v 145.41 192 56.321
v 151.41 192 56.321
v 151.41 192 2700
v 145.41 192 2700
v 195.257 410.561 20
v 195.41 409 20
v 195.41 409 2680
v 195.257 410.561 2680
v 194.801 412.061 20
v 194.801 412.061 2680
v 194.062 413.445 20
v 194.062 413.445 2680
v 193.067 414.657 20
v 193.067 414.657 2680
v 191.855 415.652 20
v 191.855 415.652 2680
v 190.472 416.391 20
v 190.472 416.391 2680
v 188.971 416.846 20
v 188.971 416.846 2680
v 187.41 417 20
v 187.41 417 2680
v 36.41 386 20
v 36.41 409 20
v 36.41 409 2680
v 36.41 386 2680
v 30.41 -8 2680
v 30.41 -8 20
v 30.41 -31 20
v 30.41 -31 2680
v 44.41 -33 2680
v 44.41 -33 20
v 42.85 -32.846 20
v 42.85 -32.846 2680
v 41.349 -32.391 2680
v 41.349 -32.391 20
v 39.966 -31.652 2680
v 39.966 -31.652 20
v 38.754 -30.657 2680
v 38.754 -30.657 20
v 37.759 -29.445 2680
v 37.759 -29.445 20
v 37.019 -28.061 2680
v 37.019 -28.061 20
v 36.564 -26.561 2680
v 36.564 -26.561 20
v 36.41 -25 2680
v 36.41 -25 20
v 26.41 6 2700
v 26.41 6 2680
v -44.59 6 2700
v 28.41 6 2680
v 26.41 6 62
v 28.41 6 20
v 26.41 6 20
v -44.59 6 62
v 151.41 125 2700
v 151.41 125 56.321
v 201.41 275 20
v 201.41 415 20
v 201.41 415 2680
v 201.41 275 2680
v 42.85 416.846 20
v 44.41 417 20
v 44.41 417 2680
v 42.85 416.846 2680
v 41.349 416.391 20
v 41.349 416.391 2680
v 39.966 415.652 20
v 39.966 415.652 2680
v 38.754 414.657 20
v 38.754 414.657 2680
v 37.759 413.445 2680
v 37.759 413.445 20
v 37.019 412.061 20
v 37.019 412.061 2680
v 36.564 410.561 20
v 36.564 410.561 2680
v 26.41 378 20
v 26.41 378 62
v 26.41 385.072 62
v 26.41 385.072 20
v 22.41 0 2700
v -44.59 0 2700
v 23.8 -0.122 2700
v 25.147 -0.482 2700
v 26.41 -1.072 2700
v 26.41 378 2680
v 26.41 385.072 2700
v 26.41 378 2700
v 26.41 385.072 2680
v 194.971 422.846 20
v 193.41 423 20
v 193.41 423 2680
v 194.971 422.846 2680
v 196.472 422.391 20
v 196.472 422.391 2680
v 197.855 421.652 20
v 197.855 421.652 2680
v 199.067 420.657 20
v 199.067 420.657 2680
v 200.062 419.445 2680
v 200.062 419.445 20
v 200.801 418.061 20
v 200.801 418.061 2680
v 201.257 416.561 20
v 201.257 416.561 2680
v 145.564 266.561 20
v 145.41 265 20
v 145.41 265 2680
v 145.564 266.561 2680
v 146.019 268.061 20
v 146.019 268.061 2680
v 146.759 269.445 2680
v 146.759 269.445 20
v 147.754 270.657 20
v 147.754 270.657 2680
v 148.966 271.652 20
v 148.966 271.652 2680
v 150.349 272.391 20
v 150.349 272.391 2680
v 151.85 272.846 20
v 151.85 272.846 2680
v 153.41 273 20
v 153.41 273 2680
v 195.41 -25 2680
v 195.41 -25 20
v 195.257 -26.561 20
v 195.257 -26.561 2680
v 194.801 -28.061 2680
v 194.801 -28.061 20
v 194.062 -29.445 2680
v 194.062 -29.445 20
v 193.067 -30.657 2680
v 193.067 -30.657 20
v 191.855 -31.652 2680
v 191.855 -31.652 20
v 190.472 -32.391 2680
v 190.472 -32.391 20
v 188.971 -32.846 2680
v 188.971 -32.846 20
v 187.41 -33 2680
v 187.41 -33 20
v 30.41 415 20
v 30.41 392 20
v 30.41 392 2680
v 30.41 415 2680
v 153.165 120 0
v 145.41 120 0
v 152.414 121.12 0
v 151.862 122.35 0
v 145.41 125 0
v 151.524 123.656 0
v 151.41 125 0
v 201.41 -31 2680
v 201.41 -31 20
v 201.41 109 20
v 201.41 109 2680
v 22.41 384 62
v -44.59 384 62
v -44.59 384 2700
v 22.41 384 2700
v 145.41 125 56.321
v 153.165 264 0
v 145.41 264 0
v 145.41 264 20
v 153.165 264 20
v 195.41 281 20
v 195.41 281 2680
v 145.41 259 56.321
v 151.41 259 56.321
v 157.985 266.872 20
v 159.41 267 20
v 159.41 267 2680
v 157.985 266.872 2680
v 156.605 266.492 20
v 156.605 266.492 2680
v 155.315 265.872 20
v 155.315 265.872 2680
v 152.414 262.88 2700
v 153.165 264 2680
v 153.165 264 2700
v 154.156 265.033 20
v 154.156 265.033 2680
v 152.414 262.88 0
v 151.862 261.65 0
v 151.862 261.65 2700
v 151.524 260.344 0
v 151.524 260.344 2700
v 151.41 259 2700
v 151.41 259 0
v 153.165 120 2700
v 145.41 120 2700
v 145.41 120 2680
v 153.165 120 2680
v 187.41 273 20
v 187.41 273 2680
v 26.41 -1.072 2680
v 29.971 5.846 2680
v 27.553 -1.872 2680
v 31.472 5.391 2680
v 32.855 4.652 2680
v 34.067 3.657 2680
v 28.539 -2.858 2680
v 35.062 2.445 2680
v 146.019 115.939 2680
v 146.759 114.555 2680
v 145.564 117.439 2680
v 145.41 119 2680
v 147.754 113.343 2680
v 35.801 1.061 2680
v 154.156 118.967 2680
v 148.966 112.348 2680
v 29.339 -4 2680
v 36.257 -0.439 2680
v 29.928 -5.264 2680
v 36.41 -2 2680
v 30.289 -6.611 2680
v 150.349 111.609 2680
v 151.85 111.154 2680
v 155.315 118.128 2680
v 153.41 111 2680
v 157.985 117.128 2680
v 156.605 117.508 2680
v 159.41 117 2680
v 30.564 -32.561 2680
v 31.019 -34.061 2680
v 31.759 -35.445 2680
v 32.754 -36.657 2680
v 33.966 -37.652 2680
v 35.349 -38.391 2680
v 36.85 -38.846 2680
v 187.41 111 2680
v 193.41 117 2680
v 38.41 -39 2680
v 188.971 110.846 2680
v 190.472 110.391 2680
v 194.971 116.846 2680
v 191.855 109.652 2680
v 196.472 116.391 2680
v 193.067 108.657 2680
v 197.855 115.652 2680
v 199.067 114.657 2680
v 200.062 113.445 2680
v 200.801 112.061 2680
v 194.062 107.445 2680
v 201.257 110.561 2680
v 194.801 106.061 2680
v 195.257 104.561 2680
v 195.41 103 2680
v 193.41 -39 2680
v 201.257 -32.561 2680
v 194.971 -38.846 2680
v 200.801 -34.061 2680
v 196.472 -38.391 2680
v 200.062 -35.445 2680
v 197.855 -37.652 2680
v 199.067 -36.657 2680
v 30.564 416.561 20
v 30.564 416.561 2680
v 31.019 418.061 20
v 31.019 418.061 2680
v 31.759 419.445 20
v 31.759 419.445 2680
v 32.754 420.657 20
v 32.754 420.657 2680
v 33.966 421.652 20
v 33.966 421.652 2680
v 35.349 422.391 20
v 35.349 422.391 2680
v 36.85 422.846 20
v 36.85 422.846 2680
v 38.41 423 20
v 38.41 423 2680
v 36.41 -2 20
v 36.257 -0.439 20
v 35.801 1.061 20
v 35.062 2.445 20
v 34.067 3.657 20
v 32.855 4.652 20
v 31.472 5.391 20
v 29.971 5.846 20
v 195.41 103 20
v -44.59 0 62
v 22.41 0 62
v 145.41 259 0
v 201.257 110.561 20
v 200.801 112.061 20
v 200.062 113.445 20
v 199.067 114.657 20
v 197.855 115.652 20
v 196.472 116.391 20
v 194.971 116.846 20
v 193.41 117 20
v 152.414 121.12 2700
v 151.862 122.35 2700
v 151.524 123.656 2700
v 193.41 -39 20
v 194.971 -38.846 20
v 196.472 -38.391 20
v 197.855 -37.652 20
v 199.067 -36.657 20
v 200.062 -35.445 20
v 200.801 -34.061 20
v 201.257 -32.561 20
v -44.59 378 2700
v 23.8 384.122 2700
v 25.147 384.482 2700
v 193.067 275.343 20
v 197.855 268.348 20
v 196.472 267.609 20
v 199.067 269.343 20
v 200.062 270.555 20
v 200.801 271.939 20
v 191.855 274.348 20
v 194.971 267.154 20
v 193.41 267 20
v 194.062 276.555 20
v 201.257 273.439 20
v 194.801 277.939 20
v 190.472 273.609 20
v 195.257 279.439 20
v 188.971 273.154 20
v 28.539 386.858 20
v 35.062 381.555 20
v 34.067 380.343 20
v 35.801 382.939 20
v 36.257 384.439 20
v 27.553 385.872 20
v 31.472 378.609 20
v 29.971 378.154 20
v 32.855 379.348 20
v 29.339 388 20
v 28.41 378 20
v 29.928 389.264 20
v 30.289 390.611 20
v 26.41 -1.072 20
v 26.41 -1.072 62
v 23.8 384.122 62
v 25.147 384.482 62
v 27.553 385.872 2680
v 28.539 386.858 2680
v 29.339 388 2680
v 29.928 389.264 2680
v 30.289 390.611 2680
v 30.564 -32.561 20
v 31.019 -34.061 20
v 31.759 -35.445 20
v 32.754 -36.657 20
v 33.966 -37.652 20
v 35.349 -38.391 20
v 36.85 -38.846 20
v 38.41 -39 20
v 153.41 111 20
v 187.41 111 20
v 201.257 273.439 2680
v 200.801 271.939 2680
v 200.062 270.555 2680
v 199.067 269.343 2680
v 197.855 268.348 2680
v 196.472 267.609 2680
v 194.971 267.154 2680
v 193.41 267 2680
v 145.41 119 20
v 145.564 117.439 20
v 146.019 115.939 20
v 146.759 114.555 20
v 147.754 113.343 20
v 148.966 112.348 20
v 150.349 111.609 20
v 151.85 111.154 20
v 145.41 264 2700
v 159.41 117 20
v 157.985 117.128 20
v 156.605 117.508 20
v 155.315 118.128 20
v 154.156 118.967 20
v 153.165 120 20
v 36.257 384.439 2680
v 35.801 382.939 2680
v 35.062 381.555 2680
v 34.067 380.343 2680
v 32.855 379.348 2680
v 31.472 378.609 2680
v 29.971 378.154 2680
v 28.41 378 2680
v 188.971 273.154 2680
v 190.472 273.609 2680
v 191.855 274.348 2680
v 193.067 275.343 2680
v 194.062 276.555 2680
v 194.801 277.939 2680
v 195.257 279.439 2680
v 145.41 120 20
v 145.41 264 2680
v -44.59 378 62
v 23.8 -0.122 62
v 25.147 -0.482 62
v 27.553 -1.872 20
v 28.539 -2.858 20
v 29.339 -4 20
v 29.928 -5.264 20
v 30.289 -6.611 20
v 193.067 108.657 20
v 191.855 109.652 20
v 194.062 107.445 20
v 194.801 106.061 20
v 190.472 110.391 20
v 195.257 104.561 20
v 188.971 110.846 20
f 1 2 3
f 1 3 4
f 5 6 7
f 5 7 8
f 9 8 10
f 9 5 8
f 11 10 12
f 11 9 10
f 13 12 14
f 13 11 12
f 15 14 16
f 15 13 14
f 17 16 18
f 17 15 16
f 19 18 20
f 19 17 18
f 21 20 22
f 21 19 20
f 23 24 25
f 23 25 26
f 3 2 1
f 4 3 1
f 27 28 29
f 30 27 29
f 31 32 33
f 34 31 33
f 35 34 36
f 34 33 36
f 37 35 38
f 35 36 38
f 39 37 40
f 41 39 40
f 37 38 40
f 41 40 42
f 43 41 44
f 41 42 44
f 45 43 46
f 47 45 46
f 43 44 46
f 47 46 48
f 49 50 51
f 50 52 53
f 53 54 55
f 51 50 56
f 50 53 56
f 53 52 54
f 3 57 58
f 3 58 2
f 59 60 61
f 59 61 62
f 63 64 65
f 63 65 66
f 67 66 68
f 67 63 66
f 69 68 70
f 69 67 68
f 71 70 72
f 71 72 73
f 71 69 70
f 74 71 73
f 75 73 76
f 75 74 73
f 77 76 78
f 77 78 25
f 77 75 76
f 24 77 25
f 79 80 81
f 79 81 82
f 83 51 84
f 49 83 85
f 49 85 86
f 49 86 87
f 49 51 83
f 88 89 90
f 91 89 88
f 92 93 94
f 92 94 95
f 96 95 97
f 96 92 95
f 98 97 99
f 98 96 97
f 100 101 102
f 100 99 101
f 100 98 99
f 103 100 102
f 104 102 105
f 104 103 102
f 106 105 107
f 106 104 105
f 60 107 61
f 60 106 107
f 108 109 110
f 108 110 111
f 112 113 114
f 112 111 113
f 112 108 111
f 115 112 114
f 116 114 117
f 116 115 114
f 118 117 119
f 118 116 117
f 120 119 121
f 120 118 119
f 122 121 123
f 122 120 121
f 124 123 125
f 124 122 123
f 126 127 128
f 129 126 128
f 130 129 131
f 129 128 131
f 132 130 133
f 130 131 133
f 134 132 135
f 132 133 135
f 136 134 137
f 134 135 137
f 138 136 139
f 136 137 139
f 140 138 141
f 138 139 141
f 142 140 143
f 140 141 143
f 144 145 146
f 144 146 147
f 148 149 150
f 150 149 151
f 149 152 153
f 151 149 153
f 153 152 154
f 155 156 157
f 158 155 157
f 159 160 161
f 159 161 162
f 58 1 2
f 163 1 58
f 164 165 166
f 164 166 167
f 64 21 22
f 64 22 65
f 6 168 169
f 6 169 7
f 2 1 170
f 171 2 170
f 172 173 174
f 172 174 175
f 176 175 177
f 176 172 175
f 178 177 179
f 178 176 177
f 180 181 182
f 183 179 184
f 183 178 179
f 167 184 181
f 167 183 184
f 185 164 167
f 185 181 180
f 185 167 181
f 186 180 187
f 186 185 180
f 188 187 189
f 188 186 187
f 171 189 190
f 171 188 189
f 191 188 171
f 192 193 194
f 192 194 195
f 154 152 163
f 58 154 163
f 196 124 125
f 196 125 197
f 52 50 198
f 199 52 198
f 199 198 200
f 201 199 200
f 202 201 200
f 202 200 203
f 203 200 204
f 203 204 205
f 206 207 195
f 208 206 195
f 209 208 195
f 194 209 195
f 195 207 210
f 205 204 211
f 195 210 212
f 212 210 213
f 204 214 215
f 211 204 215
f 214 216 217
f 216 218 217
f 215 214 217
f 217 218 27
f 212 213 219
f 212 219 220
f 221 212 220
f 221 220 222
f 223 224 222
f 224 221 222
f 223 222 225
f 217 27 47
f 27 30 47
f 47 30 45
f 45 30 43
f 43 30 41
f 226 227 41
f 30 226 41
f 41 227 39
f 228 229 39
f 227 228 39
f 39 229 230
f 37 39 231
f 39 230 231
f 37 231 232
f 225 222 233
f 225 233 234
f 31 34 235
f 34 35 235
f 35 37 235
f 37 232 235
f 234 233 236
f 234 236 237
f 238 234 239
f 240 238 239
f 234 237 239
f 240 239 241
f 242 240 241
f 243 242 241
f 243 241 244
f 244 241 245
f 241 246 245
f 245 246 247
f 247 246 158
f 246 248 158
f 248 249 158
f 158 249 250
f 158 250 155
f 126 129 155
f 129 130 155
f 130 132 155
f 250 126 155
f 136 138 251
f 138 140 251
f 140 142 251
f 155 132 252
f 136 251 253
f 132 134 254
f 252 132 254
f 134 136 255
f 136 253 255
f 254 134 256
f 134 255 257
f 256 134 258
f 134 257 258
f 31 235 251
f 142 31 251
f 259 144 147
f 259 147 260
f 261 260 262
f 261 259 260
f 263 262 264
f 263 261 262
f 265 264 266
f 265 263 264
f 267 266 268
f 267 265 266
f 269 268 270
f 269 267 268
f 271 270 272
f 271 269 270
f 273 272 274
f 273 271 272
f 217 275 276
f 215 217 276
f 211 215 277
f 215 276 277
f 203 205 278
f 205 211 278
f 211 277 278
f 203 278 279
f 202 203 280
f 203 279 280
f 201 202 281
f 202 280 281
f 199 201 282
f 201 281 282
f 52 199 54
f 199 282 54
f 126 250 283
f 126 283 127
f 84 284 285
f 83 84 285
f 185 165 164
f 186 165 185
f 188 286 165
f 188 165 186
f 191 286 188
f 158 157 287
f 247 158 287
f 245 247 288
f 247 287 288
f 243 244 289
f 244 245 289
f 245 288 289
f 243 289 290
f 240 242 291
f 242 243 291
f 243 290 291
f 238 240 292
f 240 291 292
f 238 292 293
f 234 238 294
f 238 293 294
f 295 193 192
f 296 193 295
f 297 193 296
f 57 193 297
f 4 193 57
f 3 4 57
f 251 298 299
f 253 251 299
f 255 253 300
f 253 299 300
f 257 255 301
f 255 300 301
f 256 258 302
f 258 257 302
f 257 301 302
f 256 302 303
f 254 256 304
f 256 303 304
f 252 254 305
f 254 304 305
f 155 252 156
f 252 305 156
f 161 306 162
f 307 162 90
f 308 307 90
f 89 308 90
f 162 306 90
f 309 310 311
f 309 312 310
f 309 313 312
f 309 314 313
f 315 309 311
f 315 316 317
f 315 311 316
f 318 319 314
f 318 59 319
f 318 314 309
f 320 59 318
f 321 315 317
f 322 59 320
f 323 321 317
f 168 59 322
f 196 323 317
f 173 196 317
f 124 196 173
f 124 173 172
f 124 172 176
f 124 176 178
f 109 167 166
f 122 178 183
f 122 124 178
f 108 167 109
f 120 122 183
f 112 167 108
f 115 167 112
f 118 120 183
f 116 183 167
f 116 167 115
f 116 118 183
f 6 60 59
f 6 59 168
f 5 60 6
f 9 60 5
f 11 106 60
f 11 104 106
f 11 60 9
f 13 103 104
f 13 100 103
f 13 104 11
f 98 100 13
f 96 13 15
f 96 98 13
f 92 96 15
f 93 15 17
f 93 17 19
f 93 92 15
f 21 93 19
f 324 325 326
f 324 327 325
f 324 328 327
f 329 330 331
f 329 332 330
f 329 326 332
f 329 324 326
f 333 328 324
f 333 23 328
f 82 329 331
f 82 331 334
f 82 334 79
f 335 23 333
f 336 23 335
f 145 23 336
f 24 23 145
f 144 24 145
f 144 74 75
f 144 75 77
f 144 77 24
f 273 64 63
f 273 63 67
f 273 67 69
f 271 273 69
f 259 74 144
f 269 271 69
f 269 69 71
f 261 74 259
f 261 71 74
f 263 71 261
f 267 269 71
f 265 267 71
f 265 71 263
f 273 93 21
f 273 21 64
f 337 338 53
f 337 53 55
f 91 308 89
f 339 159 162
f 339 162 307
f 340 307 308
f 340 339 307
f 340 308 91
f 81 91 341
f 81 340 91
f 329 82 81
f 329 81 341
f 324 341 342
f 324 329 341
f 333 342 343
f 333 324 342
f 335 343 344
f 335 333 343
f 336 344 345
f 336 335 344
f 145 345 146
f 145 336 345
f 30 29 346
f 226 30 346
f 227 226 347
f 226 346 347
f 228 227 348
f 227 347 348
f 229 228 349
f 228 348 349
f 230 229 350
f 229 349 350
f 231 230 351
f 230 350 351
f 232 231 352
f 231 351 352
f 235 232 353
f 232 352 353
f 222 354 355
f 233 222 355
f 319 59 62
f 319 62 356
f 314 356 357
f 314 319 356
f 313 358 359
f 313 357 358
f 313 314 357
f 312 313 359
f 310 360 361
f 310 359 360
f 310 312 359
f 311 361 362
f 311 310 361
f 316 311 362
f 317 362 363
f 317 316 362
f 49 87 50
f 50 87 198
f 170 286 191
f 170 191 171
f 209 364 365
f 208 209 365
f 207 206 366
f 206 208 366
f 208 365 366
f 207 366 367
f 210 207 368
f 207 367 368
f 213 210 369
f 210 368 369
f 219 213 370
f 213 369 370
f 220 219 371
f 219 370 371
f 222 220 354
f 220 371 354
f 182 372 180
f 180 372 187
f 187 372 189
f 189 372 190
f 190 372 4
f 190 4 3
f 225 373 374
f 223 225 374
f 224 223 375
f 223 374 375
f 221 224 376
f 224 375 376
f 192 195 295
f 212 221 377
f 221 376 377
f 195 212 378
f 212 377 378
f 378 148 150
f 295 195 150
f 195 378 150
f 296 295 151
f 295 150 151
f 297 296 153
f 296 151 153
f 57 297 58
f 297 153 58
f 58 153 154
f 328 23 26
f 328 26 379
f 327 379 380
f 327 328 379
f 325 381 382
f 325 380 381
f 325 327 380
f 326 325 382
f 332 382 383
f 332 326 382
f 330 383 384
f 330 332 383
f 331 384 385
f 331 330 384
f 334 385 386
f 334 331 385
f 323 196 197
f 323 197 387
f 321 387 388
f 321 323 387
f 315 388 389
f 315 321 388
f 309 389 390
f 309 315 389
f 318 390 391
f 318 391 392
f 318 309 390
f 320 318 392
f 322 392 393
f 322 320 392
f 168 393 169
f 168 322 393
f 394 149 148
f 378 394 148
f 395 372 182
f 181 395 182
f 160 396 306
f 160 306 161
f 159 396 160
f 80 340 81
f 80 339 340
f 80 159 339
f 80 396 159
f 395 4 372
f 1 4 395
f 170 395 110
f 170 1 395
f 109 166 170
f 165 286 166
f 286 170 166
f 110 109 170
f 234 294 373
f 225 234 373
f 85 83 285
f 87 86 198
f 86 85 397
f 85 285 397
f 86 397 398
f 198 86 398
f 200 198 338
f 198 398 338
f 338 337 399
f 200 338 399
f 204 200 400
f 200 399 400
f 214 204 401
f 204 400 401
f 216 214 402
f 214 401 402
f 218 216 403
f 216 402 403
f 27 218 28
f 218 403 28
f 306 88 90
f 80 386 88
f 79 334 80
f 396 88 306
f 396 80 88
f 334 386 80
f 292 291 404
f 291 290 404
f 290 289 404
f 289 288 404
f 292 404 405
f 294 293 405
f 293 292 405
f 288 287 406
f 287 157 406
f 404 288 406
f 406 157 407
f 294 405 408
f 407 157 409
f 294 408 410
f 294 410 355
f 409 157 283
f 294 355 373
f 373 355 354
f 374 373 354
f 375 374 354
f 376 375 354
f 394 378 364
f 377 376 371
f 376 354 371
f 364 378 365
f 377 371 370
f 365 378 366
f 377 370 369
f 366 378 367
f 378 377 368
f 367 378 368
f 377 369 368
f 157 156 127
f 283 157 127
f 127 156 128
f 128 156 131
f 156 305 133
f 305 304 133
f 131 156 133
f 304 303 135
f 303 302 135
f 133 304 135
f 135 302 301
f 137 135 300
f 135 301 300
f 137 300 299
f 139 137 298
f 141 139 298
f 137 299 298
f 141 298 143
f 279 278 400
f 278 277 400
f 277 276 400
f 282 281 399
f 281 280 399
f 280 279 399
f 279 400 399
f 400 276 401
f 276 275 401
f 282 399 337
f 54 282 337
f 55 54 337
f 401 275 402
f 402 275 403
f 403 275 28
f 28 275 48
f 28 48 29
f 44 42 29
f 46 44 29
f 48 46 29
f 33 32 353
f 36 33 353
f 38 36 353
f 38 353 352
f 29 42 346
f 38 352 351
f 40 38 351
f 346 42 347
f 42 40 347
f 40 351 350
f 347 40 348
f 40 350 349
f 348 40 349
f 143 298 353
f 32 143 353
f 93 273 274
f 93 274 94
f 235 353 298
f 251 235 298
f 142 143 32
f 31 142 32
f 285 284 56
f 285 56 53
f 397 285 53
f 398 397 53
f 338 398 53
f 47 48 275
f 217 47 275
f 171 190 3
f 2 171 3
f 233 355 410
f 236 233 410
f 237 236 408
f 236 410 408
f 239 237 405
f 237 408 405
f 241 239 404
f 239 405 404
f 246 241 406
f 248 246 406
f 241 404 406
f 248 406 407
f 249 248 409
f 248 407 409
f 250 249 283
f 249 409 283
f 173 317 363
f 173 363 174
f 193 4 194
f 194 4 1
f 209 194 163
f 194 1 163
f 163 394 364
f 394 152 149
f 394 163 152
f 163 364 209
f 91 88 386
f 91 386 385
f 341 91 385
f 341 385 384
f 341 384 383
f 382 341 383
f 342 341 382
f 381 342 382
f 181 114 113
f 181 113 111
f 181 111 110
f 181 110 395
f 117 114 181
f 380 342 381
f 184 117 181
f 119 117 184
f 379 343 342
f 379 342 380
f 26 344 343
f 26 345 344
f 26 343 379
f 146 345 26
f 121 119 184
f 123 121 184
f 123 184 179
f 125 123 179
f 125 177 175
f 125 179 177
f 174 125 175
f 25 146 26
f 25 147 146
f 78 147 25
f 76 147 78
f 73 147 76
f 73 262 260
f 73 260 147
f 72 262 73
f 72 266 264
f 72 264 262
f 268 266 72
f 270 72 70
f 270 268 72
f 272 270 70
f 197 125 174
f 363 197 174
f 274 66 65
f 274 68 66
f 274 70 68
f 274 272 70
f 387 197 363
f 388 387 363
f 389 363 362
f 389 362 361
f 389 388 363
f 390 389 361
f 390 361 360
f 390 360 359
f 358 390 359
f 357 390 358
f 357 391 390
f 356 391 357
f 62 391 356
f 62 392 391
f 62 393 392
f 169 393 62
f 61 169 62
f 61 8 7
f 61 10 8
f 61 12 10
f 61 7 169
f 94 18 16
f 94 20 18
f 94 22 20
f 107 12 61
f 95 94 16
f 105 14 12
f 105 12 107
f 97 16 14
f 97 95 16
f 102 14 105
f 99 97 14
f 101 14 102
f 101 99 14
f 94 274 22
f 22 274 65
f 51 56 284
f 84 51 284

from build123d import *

# Parameters (mm, degrees)
F1_DEPTH      = 2700
F3_DEPTH      = 159
F4_W          = 67
F4_H          = 56.321
F5_DEPTH      = 25
F7_W          = 67
F7_H          = 62
F8_DEPTH      = 423.001
F8_DEPTH_BACK = 39.001


with BuildPart() as f1:
    # F0 (on Top) → F1 (new body)
    with BuildSketch(Plane.XY):
        with BuildLine():
            Line((-44.5896353125, 6), (-44.5896353125, 0))
            Line((-44.5896353125, 0), (22.4103646875, 0))
            ThreePointArc((22.4103646875, 0), (28.067218937, -2.3431457505), (30.4103646875, -8))
            Line((30.4103646875, -8), (30.4103646875, -31))
            ThreePointArc((30.4103646875, -31), (32.753510438, -36.6568542495), (38.4103646875, -39))
            Line((38.4103646875, -39), (193.4103646875, -39))
            ThreePointArc((193.4103646875, -39), (199.067218937, -36.6568542495), (201.4103646875, -31))
            Line((201.4103646875, -31), (201.4103646875, 109))
            ThreePointArc((201.4103646875, 109), (199.067218937, 114.6568542495), (193.4103646875, 117))
            Line((193.4103646875, 117), (159.4103646875, 117))
            ThreePointArc((159.4103646875, 117), (153.753510438, 119.3431457505), (151.4103646875, 125))
            Line((151.4103646875, 125), (151.4103646875, 192))
            Line((151.4103646875, 192), (145.4103646875, 192))
            Line((145.4103646875, 192), (145.4103646875, 119))
            ThreePointArc((145.4103646875, 119), (147.753510438, 113.3431457505), (153.4103646875, 111))
            Line((153.4103646875, 111), (187.4103646875, 111))
            ThreePointArc((187.4103646875, 111), (193.067218937, 108.6568542495), (195.4103646875, 103))
            Line((195.4103646875, 103), (195.4103646875, -25))
            ThreePointArc((195.4103646875, -25), (193.067218937, -30.6568542495), (187.4103646875, -33))
            Line((187.4103646875, -33), (44.4103646875, -33))
            ThreePointArc((44.4103646875, -33), (38.753510438, -30.6568542495), (36.4103646875, -25))
            Line((36.4103646875, -25), (36.4103646875, -2))
            ThreePointArc((36.4103646875, -2), (34.067218937, 3.6568542495), (28.4103646875, 6))
            Line((28.4103646875, 6), (-44.5896353125, 6))
        make_face()
    extrude(amount=F1_DEPTH)

    # F2 (on face) → F3 (cut)
    with BuildSketch(Plane.XZ.offset(39)):
        Polygon((201.4103646875, 0), (201.4103646875, 20), (193.4103646875, 20), (26.4103646875, 20), (26.4103646875, 0), (38.4103646875, 0), (193.4103646875, 0), align=None)
        Polygon((193.4103646875, 2700), (38.4103646875, 2700), (26.4103646875, 2700), (26.4103646875, 2680), (193.4103646875, 2680), (201.4103646875, 2680), (201.4103646875, 2700), align=None)
    extrude(amount=-F3_DEPTH, mode=Mode.SUBTRACT)

    # F4 (on face) → F5 (cut)
    with BuildSketch(Plane(origin=(145.4103646875, 0, 0), x_dir=(0, -1, 0), z_dir=(-1, 0, 0))):
        with Locations((-158.5, 28.1605)):
            Rectangle(F4_W, F4_H)
    extrude(amount=-F5_DEPTH, mode=Mode.SUBTRACT)


with BuildPart() as f6_1:
    # F6: instance of F1
    add(f1.part.mirror(Plane(origin=(148.4103646875, 192, 1378.1605), x_dir=(-1, 0, 0), z_dir=(0, 1, 0))))


with BuildPart() as f8_tool:
    # F7 (on face) → F8 (new body, two sides)
    with BuildSketch(Plane(origin=(0, 384, 0), x_dir=(-1, 0, 0), z_dir=(0, 1, 0))) as f8_sk:
        Polygon((-22.4103646875, 0), (-22.4103646875, 62), (-26.4103646875, 62), (-26.4103646875, 20), (-26.4103646875, 0), align=None)
        with Locations((11.0896353125, 31)):
            Rectangle(F7_W, F7_H)
    extrude(amount=-F8_DEPTH)
    extrude(f8_sk.sketch, amount=F8_DEPTH_BACK)


with BuildPart() as f1_1:
    add(f1.part)

    # F8: cut by f8_tool
    add(f8_tool.part, mode=Mode.SUBTRACT)


with BuildPart() as f6_1_1:
    add(f6_1.part)

    # F8: cut by f8_tool
    add(f8_tool.part, mode=Mode.SUBTRACT)


solid = Compound([f1_1.part, f6_1_1.part])
